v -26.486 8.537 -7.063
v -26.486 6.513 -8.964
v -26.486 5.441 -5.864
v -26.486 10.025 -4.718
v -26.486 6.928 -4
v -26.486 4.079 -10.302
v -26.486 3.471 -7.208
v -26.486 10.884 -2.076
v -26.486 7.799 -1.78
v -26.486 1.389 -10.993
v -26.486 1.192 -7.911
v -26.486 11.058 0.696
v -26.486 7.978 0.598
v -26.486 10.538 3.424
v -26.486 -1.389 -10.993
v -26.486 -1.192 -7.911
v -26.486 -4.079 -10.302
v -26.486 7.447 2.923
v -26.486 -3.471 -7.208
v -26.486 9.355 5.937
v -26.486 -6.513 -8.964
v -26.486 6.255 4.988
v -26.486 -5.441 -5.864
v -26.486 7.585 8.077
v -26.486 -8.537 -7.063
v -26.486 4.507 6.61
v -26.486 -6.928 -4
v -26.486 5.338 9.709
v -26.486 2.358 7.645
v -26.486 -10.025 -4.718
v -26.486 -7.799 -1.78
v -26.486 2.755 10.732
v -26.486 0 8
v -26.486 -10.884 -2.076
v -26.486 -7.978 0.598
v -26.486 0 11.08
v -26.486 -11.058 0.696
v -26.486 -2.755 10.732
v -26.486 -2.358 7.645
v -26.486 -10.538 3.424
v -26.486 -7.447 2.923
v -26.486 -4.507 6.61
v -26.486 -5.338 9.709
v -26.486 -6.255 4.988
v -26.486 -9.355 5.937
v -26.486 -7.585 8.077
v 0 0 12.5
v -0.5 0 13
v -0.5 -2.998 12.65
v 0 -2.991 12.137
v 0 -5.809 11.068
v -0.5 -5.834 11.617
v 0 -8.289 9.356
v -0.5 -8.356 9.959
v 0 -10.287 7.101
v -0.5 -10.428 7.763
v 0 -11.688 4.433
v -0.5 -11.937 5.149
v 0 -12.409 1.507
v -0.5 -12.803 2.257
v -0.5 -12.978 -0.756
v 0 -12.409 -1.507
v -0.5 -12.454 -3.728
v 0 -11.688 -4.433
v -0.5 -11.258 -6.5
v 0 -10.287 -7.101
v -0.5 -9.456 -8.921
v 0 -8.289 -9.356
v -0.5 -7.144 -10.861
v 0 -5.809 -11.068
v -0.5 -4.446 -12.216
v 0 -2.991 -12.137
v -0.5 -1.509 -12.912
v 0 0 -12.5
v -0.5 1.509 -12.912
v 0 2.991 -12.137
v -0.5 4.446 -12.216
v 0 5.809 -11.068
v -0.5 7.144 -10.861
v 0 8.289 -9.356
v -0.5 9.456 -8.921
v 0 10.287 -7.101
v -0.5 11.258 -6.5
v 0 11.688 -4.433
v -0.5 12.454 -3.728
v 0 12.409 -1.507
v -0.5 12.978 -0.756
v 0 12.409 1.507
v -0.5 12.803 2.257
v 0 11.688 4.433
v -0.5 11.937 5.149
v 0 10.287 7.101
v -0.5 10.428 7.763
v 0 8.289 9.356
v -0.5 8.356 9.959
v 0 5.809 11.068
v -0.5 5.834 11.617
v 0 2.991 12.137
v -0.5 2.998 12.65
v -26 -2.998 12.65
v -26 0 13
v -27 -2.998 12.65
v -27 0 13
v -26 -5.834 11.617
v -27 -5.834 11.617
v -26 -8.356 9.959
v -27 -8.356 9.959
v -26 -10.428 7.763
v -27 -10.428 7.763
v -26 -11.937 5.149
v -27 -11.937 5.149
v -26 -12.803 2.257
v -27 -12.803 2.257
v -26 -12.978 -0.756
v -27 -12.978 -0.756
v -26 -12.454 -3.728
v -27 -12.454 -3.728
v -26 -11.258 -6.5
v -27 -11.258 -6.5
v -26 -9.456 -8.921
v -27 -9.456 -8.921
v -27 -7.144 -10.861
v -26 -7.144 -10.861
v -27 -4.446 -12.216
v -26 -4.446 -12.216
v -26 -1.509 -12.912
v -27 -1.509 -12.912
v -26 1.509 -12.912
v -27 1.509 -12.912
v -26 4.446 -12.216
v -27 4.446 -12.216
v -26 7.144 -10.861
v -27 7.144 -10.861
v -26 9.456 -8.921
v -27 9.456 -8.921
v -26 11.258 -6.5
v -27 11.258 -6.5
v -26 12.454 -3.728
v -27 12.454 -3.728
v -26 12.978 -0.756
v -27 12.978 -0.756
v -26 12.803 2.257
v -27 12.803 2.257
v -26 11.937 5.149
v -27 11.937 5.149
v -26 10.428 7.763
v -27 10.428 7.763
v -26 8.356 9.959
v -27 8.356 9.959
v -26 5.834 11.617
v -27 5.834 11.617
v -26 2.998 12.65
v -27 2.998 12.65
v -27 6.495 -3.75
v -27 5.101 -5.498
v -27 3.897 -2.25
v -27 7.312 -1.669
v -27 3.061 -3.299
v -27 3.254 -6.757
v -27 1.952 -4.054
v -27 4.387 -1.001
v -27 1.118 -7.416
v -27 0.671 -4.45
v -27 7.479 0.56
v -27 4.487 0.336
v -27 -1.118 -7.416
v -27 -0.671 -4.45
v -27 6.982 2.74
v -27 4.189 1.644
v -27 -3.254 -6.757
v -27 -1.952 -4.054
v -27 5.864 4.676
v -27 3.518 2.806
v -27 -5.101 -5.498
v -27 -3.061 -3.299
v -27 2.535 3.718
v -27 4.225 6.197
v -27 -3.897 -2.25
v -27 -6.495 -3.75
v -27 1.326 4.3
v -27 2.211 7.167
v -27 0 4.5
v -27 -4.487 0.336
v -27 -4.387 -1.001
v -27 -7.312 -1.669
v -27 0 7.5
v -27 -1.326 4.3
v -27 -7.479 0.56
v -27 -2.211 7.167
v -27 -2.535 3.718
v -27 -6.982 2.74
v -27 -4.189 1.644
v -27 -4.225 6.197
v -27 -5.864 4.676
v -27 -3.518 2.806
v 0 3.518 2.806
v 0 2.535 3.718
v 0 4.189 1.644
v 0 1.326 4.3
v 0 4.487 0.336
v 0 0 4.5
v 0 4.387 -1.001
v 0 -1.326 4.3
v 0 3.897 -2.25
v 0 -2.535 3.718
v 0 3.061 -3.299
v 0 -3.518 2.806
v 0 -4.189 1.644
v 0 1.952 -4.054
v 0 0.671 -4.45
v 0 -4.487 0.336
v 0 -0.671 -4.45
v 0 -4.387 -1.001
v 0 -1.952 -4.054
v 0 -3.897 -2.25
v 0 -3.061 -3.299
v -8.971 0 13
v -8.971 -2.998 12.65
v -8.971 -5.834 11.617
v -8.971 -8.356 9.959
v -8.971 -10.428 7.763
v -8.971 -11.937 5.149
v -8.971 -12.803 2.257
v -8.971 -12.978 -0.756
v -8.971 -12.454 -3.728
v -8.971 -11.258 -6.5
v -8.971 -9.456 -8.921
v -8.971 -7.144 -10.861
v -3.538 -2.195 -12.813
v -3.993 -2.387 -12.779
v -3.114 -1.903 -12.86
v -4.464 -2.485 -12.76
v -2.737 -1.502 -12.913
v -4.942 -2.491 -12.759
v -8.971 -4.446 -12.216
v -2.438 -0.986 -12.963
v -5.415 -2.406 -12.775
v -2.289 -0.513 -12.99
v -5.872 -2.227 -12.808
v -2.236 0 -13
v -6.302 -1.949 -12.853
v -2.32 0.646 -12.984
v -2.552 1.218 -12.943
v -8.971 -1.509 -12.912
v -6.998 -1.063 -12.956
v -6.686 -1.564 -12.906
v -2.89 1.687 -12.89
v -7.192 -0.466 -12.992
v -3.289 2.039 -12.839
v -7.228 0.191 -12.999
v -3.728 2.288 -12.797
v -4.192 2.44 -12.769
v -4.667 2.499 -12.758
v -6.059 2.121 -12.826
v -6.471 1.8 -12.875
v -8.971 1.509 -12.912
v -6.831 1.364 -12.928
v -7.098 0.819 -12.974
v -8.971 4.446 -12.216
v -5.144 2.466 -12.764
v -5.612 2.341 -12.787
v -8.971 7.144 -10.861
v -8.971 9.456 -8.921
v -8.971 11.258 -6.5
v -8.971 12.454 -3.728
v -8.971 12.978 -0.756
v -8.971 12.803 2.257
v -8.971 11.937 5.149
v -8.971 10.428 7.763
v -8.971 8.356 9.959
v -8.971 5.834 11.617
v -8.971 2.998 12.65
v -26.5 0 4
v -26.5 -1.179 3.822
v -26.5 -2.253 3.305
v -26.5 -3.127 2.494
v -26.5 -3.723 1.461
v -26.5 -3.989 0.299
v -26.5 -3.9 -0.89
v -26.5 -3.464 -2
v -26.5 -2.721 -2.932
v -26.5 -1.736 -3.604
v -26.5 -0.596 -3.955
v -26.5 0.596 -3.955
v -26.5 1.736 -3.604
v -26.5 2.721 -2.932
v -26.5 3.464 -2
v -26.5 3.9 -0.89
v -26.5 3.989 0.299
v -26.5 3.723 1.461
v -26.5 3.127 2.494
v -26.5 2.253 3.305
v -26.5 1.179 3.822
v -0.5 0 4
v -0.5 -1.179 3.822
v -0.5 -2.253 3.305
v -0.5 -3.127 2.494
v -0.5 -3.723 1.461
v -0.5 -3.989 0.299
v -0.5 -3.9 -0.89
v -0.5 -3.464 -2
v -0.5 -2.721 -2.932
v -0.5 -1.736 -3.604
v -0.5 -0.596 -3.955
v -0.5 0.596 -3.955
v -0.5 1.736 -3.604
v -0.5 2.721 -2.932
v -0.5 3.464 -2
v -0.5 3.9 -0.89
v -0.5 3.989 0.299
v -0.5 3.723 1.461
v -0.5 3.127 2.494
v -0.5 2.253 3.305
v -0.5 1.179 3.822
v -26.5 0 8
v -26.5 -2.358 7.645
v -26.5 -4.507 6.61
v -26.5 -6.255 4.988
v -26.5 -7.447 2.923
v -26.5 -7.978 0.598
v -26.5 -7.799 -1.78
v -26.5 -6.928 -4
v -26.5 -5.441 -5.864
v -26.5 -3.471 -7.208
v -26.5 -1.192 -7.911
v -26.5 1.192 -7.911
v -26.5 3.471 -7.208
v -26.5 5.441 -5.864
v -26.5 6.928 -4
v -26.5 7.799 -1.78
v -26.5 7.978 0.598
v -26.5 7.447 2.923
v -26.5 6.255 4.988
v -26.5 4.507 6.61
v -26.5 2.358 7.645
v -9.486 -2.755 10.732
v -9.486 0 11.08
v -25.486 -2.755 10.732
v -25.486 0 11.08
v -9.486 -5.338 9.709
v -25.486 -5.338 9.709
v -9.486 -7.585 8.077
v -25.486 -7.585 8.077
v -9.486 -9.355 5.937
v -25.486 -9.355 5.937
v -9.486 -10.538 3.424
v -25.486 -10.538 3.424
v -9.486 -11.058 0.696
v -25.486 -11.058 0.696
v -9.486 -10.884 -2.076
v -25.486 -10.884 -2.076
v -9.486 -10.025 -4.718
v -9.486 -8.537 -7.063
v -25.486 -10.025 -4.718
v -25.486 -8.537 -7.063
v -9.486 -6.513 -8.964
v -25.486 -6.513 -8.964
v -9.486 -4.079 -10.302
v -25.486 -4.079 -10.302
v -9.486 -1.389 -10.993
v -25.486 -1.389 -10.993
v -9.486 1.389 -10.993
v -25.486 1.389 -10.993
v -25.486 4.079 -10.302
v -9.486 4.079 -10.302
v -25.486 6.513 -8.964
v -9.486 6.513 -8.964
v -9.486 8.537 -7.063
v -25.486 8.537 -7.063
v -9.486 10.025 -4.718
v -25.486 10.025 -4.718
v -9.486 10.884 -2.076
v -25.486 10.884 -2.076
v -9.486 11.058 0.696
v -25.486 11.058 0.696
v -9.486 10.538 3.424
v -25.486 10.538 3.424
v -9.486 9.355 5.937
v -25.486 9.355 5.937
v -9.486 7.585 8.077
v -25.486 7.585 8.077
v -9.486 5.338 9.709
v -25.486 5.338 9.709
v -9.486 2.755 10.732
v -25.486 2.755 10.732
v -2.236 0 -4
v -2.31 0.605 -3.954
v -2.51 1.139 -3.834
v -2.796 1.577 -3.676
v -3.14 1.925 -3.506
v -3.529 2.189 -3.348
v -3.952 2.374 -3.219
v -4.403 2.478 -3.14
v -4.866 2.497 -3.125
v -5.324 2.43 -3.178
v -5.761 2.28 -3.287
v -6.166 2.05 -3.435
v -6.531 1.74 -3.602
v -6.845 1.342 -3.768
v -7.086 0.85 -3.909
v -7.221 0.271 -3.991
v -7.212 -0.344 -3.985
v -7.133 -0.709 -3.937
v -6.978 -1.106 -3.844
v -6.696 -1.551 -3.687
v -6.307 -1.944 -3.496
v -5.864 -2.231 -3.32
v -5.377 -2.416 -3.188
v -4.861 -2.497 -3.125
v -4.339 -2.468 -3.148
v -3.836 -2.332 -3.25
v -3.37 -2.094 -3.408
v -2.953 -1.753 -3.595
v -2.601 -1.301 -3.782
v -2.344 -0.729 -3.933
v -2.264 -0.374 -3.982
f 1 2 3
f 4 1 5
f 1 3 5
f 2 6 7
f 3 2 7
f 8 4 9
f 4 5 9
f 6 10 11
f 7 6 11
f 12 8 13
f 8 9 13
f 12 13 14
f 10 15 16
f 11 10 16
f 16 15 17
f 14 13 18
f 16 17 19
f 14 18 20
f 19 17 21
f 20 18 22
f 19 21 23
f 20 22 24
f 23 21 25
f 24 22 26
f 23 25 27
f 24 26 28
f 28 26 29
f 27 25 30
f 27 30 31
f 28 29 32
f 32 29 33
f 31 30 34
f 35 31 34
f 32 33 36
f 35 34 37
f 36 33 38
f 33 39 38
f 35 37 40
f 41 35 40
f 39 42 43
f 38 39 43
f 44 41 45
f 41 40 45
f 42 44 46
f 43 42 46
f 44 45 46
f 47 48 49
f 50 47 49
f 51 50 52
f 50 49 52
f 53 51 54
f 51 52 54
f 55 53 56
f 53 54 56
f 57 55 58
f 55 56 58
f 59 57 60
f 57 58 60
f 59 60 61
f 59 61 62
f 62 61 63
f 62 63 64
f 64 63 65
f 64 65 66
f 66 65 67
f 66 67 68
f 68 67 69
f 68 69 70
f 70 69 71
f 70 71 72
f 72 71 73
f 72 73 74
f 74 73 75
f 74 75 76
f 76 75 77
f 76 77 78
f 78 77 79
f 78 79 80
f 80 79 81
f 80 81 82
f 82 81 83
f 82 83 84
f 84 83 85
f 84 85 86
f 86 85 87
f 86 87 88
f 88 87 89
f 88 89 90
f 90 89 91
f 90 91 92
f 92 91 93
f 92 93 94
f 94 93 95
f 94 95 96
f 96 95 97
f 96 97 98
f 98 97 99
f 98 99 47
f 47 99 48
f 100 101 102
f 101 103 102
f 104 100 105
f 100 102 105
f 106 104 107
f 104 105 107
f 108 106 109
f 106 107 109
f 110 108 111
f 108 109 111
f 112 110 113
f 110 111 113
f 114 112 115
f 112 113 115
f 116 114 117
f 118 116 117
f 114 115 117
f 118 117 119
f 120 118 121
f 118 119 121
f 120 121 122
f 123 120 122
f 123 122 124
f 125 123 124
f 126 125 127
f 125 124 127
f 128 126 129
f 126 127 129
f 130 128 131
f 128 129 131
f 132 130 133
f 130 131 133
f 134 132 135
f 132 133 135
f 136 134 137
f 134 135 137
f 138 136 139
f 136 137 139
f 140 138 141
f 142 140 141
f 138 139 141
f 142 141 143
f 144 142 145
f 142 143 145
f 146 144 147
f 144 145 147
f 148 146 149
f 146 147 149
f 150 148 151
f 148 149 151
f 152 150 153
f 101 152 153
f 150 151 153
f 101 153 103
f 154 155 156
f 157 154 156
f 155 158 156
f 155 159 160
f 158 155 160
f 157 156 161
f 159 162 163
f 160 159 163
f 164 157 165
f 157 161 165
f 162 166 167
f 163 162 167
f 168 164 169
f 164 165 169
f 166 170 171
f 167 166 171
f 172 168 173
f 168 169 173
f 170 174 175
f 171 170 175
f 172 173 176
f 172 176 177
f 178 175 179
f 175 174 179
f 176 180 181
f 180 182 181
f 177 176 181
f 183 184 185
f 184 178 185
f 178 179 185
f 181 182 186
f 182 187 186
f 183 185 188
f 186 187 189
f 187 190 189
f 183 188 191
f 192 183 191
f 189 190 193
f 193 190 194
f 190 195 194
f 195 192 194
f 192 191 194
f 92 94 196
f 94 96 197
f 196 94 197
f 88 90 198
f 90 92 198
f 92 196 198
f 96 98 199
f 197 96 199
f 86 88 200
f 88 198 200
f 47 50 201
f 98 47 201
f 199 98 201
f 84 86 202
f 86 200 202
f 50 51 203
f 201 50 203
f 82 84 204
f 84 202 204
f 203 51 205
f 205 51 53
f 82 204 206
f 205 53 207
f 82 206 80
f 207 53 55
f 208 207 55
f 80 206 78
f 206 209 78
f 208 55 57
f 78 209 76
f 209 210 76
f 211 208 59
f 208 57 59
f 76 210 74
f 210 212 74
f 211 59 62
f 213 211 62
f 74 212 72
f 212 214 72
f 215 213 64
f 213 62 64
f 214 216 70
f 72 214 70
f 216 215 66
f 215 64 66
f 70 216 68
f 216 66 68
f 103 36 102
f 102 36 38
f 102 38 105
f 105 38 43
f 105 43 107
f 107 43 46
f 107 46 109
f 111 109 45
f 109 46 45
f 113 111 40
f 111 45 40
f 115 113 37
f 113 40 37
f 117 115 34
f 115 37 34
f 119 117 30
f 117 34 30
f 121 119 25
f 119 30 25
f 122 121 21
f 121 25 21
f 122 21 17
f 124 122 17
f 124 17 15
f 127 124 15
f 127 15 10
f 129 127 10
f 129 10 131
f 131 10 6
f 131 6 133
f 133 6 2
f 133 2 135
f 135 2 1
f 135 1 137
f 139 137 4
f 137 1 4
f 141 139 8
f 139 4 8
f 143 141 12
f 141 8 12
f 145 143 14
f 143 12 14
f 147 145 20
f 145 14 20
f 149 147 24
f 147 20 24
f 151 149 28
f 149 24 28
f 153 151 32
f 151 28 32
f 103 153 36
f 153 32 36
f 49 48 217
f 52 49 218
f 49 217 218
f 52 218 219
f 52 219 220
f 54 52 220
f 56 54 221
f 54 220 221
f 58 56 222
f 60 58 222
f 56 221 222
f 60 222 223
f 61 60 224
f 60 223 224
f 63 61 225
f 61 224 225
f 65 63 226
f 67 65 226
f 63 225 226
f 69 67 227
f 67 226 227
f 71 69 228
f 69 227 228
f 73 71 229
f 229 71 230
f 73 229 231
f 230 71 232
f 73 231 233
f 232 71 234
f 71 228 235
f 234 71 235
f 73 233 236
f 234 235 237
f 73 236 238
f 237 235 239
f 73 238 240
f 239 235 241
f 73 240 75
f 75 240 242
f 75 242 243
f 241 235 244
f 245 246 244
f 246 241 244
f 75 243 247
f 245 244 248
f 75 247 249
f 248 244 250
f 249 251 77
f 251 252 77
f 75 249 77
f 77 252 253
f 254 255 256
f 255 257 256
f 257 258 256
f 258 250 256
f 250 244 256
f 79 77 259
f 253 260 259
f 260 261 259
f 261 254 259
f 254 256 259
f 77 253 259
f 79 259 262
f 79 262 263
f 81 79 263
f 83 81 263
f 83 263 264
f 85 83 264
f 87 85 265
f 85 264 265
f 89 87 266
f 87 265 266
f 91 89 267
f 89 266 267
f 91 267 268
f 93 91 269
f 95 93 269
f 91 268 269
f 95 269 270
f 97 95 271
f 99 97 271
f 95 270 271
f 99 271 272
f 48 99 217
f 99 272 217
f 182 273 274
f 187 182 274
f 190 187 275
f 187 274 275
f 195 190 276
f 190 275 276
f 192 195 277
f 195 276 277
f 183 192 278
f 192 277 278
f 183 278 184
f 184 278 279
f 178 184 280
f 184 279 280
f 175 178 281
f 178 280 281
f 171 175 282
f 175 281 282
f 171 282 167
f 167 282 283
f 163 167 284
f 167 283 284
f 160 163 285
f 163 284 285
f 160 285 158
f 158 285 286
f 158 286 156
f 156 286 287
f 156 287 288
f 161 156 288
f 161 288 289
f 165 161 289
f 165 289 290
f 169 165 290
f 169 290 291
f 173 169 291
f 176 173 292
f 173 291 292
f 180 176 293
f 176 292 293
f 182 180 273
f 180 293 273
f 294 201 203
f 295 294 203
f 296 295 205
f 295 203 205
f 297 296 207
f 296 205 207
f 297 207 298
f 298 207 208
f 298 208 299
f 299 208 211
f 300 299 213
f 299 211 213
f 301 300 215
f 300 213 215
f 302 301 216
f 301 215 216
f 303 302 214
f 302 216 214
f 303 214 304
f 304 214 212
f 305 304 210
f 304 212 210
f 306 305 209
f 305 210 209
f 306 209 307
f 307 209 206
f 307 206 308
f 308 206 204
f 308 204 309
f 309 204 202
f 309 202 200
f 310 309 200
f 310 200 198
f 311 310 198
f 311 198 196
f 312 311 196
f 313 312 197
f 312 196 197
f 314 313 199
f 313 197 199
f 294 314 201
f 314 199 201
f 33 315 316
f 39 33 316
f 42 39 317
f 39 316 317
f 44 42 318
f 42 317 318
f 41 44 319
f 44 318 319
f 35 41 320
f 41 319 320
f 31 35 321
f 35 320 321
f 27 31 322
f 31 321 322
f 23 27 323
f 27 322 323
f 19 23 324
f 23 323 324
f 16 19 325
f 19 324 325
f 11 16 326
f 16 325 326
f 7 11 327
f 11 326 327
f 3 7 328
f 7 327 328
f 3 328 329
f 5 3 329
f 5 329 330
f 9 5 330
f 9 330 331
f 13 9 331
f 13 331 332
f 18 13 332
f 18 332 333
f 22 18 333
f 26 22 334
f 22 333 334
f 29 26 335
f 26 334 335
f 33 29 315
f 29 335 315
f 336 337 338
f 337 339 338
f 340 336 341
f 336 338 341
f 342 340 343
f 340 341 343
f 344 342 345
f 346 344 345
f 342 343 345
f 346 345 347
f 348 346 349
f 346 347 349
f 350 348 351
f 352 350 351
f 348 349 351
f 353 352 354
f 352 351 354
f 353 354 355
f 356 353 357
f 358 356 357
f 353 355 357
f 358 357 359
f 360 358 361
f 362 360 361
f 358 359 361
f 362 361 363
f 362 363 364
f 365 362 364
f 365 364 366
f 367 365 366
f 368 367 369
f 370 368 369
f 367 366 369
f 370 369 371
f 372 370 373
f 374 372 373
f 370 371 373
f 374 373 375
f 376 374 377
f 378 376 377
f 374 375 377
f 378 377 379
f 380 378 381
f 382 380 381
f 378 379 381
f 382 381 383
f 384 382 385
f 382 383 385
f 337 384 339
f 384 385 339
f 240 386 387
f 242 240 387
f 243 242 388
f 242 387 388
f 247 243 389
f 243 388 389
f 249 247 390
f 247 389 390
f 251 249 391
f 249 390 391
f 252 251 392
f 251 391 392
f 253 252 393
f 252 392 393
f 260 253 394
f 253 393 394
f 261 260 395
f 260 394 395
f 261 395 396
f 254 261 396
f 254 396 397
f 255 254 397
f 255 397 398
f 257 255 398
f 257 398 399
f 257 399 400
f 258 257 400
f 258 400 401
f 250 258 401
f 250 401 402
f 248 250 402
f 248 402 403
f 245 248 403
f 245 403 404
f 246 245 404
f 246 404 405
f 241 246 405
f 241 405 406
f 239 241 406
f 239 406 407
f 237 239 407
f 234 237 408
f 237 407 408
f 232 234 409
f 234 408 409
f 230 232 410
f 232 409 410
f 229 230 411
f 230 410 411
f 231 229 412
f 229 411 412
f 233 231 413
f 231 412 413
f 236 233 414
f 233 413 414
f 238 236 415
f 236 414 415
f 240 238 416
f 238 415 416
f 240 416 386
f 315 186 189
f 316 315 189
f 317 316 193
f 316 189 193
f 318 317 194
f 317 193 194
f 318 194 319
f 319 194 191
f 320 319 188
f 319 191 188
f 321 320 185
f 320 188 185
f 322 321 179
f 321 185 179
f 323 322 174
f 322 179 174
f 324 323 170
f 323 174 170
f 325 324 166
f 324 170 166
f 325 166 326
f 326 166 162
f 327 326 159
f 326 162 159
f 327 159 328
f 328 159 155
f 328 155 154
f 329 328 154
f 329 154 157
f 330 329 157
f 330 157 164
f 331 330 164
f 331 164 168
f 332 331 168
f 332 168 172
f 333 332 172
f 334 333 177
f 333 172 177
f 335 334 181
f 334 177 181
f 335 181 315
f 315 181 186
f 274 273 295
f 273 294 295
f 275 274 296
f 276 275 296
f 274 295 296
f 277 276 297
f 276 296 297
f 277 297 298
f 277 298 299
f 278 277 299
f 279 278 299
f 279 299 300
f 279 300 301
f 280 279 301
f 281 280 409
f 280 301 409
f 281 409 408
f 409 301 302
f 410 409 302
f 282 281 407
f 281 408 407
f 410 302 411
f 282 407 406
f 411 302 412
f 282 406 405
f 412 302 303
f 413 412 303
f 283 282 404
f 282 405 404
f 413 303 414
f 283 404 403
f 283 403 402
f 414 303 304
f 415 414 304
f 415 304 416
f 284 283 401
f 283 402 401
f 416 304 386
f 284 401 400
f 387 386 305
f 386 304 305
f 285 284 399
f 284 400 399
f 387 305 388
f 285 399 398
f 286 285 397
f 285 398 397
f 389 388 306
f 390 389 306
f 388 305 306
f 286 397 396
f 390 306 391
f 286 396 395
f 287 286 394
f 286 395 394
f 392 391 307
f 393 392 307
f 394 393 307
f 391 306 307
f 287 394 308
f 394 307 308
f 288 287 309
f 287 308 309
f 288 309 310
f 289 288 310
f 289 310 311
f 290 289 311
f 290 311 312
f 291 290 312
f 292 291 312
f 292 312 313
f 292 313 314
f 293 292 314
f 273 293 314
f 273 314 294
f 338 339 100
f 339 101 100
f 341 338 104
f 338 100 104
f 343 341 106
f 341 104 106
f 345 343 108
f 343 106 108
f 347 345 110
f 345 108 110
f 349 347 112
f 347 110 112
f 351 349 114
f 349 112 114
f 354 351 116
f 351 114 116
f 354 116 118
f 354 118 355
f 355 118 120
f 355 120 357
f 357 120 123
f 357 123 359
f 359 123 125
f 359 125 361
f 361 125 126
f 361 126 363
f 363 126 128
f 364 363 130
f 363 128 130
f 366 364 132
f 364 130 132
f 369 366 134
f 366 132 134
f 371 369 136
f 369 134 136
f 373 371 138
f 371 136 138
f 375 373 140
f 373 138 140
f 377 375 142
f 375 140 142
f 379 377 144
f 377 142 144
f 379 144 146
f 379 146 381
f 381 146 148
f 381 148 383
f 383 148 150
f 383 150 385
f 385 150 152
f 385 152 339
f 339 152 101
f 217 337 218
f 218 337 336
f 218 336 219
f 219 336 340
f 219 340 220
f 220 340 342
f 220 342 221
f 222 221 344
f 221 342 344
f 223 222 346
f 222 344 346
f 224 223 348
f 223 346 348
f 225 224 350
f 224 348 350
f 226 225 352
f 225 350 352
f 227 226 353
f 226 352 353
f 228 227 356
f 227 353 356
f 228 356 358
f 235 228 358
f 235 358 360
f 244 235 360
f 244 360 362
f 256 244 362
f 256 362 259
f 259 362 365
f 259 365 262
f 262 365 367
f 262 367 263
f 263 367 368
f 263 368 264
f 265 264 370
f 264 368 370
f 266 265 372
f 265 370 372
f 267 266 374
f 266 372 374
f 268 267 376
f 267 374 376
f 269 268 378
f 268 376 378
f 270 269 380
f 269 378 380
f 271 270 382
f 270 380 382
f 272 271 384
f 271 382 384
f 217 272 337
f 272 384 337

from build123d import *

# Parameters (mm, degrees)
F2_SIZE  = 0.5
F4_D     = 5
F4_DEPTH = 13.001


with BuildPart() as f1:
    # F0 (on Front) → F1 (revolve)
    with BuildSketch(Plane.XZ):
        Polygon((-8.9710751011, 13), (-9.4855375505, 11.08), (-25.4855375505, 11.08), (-26, 13), (-27, 13), (-26.4855375505, 11.08), (-26.4855375505, 8), (-27, 8), (-27, 4), (0, 4), (0, 13), align=None)
    revolve(axis=Axis((-13.5, 0, 0), (1, 0, 0)))

    # F2
    f2_edges = [f1.edges().sort_by_distance(p)[0] for p in [
        (0, 0, -4),
        (0, 0, -13),
        (-27, 0, -8),
        (-27, 0, -4),
    ]]
    chamfer(f2_edges, length=F2_SIZE)

    # F4 (through all, one way)
    with BuildSketch(Plane.XY):
        with Locations((-4.7355375505, 0)):
            Circle(F4_D / 2)
    extrude(amount=-F4_DEPTH, mode=Mode.SUBTRACT)


solid = f1.part
